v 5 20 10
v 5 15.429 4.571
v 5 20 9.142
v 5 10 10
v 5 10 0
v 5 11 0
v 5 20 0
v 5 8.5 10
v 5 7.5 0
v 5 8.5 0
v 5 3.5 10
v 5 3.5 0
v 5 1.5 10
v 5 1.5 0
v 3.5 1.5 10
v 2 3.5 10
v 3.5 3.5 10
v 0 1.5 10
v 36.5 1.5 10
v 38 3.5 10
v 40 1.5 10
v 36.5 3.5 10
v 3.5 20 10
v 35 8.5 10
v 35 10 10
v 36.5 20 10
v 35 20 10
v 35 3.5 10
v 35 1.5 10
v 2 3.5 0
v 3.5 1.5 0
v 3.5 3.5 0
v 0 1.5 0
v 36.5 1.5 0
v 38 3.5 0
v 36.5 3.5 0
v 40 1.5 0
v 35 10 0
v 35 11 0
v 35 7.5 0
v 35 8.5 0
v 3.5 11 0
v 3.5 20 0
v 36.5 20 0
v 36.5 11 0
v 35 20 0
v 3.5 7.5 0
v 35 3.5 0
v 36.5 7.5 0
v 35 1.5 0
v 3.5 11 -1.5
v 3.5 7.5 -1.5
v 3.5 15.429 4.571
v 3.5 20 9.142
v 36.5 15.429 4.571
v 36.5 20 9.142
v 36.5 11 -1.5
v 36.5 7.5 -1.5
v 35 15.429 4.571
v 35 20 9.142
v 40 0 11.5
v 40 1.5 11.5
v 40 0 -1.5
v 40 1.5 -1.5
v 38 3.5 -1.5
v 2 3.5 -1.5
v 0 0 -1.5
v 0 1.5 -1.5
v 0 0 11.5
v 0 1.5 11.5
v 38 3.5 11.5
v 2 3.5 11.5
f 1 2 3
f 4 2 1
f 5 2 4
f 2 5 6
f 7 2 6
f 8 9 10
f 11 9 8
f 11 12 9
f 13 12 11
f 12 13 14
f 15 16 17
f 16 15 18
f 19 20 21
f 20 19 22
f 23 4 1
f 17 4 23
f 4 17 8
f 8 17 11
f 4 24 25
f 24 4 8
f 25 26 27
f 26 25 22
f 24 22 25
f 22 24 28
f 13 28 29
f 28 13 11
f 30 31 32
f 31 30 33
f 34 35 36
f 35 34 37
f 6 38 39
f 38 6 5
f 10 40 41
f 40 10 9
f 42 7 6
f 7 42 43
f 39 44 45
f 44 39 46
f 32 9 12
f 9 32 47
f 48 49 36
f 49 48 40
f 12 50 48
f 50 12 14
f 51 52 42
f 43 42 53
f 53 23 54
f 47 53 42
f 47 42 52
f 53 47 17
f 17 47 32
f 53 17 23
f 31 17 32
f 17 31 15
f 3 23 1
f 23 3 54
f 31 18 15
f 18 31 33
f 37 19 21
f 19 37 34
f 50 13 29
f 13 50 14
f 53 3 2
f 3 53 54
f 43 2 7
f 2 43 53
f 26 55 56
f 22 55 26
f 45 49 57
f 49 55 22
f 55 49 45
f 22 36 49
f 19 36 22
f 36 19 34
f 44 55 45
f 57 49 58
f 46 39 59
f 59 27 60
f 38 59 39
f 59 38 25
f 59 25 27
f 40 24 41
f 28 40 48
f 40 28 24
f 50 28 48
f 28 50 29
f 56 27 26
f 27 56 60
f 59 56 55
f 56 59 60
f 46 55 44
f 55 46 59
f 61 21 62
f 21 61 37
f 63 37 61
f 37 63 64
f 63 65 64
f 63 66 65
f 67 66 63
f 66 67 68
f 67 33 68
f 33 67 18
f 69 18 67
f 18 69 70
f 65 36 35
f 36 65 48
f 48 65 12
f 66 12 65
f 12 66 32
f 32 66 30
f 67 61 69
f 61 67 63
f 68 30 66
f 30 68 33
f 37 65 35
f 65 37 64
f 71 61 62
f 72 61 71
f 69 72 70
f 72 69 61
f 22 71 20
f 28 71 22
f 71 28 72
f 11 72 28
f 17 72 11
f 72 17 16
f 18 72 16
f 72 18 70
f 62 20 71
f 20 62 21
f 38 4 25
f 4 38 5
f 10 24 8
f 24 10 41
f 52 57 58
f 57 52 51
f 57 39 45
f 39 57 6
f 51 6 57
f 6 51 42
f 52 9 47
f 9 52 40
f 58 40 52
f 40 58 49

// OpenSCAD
// top
cube([40,1.5,10]);

// legs
translate([3.5,1.5,0]){
	difference(){
		cube([1.5, 18.5, 10]);
			translate([-1,21,-2.5]){
			rotate([45,0,0]){
				cube([3,10,10]);
			}
		}
	}
}

translate([35,1.5,0]){
	difference(){
		cube([1.5, 18.5, 10]);
			translate([-1,21,-2.5]){
			rotate([45,0,0]){
				cube([3,10,10]);
			}
		}
	}
}

// shelf
translate([5,8.5,0]){
	cube([30,1.5,10]);
}

// shelf brace
translate([3.5,7.5,-1.5]){
	cube([33,3.5,1.5]);
}

// leg braces
translate([0,0,-1.5]){
	difference(){
		cube([40,3.5,1.5]);
		translate([0,1.5,-.25]){
			rotate([0,0,45]){
				cube([3,3,2]);
			}
		}
		translate([40,1.5,-.25]){
			rotate([0,0,45]){
				cube([3,3,2]);
			}
		}
	}
}
translate([0,0,10]){
	difference(){
		cube([40,3.5,1.5]);
		translate([0,1.5,-.25]){
			rotate([0,0,45]){
				cube([3,3,2]);
			}
		}
		translate([40,1.5,-.25]){
			rotate([0,0,45]){
				cube([3,3,2]);
			}
		}
	}
}
